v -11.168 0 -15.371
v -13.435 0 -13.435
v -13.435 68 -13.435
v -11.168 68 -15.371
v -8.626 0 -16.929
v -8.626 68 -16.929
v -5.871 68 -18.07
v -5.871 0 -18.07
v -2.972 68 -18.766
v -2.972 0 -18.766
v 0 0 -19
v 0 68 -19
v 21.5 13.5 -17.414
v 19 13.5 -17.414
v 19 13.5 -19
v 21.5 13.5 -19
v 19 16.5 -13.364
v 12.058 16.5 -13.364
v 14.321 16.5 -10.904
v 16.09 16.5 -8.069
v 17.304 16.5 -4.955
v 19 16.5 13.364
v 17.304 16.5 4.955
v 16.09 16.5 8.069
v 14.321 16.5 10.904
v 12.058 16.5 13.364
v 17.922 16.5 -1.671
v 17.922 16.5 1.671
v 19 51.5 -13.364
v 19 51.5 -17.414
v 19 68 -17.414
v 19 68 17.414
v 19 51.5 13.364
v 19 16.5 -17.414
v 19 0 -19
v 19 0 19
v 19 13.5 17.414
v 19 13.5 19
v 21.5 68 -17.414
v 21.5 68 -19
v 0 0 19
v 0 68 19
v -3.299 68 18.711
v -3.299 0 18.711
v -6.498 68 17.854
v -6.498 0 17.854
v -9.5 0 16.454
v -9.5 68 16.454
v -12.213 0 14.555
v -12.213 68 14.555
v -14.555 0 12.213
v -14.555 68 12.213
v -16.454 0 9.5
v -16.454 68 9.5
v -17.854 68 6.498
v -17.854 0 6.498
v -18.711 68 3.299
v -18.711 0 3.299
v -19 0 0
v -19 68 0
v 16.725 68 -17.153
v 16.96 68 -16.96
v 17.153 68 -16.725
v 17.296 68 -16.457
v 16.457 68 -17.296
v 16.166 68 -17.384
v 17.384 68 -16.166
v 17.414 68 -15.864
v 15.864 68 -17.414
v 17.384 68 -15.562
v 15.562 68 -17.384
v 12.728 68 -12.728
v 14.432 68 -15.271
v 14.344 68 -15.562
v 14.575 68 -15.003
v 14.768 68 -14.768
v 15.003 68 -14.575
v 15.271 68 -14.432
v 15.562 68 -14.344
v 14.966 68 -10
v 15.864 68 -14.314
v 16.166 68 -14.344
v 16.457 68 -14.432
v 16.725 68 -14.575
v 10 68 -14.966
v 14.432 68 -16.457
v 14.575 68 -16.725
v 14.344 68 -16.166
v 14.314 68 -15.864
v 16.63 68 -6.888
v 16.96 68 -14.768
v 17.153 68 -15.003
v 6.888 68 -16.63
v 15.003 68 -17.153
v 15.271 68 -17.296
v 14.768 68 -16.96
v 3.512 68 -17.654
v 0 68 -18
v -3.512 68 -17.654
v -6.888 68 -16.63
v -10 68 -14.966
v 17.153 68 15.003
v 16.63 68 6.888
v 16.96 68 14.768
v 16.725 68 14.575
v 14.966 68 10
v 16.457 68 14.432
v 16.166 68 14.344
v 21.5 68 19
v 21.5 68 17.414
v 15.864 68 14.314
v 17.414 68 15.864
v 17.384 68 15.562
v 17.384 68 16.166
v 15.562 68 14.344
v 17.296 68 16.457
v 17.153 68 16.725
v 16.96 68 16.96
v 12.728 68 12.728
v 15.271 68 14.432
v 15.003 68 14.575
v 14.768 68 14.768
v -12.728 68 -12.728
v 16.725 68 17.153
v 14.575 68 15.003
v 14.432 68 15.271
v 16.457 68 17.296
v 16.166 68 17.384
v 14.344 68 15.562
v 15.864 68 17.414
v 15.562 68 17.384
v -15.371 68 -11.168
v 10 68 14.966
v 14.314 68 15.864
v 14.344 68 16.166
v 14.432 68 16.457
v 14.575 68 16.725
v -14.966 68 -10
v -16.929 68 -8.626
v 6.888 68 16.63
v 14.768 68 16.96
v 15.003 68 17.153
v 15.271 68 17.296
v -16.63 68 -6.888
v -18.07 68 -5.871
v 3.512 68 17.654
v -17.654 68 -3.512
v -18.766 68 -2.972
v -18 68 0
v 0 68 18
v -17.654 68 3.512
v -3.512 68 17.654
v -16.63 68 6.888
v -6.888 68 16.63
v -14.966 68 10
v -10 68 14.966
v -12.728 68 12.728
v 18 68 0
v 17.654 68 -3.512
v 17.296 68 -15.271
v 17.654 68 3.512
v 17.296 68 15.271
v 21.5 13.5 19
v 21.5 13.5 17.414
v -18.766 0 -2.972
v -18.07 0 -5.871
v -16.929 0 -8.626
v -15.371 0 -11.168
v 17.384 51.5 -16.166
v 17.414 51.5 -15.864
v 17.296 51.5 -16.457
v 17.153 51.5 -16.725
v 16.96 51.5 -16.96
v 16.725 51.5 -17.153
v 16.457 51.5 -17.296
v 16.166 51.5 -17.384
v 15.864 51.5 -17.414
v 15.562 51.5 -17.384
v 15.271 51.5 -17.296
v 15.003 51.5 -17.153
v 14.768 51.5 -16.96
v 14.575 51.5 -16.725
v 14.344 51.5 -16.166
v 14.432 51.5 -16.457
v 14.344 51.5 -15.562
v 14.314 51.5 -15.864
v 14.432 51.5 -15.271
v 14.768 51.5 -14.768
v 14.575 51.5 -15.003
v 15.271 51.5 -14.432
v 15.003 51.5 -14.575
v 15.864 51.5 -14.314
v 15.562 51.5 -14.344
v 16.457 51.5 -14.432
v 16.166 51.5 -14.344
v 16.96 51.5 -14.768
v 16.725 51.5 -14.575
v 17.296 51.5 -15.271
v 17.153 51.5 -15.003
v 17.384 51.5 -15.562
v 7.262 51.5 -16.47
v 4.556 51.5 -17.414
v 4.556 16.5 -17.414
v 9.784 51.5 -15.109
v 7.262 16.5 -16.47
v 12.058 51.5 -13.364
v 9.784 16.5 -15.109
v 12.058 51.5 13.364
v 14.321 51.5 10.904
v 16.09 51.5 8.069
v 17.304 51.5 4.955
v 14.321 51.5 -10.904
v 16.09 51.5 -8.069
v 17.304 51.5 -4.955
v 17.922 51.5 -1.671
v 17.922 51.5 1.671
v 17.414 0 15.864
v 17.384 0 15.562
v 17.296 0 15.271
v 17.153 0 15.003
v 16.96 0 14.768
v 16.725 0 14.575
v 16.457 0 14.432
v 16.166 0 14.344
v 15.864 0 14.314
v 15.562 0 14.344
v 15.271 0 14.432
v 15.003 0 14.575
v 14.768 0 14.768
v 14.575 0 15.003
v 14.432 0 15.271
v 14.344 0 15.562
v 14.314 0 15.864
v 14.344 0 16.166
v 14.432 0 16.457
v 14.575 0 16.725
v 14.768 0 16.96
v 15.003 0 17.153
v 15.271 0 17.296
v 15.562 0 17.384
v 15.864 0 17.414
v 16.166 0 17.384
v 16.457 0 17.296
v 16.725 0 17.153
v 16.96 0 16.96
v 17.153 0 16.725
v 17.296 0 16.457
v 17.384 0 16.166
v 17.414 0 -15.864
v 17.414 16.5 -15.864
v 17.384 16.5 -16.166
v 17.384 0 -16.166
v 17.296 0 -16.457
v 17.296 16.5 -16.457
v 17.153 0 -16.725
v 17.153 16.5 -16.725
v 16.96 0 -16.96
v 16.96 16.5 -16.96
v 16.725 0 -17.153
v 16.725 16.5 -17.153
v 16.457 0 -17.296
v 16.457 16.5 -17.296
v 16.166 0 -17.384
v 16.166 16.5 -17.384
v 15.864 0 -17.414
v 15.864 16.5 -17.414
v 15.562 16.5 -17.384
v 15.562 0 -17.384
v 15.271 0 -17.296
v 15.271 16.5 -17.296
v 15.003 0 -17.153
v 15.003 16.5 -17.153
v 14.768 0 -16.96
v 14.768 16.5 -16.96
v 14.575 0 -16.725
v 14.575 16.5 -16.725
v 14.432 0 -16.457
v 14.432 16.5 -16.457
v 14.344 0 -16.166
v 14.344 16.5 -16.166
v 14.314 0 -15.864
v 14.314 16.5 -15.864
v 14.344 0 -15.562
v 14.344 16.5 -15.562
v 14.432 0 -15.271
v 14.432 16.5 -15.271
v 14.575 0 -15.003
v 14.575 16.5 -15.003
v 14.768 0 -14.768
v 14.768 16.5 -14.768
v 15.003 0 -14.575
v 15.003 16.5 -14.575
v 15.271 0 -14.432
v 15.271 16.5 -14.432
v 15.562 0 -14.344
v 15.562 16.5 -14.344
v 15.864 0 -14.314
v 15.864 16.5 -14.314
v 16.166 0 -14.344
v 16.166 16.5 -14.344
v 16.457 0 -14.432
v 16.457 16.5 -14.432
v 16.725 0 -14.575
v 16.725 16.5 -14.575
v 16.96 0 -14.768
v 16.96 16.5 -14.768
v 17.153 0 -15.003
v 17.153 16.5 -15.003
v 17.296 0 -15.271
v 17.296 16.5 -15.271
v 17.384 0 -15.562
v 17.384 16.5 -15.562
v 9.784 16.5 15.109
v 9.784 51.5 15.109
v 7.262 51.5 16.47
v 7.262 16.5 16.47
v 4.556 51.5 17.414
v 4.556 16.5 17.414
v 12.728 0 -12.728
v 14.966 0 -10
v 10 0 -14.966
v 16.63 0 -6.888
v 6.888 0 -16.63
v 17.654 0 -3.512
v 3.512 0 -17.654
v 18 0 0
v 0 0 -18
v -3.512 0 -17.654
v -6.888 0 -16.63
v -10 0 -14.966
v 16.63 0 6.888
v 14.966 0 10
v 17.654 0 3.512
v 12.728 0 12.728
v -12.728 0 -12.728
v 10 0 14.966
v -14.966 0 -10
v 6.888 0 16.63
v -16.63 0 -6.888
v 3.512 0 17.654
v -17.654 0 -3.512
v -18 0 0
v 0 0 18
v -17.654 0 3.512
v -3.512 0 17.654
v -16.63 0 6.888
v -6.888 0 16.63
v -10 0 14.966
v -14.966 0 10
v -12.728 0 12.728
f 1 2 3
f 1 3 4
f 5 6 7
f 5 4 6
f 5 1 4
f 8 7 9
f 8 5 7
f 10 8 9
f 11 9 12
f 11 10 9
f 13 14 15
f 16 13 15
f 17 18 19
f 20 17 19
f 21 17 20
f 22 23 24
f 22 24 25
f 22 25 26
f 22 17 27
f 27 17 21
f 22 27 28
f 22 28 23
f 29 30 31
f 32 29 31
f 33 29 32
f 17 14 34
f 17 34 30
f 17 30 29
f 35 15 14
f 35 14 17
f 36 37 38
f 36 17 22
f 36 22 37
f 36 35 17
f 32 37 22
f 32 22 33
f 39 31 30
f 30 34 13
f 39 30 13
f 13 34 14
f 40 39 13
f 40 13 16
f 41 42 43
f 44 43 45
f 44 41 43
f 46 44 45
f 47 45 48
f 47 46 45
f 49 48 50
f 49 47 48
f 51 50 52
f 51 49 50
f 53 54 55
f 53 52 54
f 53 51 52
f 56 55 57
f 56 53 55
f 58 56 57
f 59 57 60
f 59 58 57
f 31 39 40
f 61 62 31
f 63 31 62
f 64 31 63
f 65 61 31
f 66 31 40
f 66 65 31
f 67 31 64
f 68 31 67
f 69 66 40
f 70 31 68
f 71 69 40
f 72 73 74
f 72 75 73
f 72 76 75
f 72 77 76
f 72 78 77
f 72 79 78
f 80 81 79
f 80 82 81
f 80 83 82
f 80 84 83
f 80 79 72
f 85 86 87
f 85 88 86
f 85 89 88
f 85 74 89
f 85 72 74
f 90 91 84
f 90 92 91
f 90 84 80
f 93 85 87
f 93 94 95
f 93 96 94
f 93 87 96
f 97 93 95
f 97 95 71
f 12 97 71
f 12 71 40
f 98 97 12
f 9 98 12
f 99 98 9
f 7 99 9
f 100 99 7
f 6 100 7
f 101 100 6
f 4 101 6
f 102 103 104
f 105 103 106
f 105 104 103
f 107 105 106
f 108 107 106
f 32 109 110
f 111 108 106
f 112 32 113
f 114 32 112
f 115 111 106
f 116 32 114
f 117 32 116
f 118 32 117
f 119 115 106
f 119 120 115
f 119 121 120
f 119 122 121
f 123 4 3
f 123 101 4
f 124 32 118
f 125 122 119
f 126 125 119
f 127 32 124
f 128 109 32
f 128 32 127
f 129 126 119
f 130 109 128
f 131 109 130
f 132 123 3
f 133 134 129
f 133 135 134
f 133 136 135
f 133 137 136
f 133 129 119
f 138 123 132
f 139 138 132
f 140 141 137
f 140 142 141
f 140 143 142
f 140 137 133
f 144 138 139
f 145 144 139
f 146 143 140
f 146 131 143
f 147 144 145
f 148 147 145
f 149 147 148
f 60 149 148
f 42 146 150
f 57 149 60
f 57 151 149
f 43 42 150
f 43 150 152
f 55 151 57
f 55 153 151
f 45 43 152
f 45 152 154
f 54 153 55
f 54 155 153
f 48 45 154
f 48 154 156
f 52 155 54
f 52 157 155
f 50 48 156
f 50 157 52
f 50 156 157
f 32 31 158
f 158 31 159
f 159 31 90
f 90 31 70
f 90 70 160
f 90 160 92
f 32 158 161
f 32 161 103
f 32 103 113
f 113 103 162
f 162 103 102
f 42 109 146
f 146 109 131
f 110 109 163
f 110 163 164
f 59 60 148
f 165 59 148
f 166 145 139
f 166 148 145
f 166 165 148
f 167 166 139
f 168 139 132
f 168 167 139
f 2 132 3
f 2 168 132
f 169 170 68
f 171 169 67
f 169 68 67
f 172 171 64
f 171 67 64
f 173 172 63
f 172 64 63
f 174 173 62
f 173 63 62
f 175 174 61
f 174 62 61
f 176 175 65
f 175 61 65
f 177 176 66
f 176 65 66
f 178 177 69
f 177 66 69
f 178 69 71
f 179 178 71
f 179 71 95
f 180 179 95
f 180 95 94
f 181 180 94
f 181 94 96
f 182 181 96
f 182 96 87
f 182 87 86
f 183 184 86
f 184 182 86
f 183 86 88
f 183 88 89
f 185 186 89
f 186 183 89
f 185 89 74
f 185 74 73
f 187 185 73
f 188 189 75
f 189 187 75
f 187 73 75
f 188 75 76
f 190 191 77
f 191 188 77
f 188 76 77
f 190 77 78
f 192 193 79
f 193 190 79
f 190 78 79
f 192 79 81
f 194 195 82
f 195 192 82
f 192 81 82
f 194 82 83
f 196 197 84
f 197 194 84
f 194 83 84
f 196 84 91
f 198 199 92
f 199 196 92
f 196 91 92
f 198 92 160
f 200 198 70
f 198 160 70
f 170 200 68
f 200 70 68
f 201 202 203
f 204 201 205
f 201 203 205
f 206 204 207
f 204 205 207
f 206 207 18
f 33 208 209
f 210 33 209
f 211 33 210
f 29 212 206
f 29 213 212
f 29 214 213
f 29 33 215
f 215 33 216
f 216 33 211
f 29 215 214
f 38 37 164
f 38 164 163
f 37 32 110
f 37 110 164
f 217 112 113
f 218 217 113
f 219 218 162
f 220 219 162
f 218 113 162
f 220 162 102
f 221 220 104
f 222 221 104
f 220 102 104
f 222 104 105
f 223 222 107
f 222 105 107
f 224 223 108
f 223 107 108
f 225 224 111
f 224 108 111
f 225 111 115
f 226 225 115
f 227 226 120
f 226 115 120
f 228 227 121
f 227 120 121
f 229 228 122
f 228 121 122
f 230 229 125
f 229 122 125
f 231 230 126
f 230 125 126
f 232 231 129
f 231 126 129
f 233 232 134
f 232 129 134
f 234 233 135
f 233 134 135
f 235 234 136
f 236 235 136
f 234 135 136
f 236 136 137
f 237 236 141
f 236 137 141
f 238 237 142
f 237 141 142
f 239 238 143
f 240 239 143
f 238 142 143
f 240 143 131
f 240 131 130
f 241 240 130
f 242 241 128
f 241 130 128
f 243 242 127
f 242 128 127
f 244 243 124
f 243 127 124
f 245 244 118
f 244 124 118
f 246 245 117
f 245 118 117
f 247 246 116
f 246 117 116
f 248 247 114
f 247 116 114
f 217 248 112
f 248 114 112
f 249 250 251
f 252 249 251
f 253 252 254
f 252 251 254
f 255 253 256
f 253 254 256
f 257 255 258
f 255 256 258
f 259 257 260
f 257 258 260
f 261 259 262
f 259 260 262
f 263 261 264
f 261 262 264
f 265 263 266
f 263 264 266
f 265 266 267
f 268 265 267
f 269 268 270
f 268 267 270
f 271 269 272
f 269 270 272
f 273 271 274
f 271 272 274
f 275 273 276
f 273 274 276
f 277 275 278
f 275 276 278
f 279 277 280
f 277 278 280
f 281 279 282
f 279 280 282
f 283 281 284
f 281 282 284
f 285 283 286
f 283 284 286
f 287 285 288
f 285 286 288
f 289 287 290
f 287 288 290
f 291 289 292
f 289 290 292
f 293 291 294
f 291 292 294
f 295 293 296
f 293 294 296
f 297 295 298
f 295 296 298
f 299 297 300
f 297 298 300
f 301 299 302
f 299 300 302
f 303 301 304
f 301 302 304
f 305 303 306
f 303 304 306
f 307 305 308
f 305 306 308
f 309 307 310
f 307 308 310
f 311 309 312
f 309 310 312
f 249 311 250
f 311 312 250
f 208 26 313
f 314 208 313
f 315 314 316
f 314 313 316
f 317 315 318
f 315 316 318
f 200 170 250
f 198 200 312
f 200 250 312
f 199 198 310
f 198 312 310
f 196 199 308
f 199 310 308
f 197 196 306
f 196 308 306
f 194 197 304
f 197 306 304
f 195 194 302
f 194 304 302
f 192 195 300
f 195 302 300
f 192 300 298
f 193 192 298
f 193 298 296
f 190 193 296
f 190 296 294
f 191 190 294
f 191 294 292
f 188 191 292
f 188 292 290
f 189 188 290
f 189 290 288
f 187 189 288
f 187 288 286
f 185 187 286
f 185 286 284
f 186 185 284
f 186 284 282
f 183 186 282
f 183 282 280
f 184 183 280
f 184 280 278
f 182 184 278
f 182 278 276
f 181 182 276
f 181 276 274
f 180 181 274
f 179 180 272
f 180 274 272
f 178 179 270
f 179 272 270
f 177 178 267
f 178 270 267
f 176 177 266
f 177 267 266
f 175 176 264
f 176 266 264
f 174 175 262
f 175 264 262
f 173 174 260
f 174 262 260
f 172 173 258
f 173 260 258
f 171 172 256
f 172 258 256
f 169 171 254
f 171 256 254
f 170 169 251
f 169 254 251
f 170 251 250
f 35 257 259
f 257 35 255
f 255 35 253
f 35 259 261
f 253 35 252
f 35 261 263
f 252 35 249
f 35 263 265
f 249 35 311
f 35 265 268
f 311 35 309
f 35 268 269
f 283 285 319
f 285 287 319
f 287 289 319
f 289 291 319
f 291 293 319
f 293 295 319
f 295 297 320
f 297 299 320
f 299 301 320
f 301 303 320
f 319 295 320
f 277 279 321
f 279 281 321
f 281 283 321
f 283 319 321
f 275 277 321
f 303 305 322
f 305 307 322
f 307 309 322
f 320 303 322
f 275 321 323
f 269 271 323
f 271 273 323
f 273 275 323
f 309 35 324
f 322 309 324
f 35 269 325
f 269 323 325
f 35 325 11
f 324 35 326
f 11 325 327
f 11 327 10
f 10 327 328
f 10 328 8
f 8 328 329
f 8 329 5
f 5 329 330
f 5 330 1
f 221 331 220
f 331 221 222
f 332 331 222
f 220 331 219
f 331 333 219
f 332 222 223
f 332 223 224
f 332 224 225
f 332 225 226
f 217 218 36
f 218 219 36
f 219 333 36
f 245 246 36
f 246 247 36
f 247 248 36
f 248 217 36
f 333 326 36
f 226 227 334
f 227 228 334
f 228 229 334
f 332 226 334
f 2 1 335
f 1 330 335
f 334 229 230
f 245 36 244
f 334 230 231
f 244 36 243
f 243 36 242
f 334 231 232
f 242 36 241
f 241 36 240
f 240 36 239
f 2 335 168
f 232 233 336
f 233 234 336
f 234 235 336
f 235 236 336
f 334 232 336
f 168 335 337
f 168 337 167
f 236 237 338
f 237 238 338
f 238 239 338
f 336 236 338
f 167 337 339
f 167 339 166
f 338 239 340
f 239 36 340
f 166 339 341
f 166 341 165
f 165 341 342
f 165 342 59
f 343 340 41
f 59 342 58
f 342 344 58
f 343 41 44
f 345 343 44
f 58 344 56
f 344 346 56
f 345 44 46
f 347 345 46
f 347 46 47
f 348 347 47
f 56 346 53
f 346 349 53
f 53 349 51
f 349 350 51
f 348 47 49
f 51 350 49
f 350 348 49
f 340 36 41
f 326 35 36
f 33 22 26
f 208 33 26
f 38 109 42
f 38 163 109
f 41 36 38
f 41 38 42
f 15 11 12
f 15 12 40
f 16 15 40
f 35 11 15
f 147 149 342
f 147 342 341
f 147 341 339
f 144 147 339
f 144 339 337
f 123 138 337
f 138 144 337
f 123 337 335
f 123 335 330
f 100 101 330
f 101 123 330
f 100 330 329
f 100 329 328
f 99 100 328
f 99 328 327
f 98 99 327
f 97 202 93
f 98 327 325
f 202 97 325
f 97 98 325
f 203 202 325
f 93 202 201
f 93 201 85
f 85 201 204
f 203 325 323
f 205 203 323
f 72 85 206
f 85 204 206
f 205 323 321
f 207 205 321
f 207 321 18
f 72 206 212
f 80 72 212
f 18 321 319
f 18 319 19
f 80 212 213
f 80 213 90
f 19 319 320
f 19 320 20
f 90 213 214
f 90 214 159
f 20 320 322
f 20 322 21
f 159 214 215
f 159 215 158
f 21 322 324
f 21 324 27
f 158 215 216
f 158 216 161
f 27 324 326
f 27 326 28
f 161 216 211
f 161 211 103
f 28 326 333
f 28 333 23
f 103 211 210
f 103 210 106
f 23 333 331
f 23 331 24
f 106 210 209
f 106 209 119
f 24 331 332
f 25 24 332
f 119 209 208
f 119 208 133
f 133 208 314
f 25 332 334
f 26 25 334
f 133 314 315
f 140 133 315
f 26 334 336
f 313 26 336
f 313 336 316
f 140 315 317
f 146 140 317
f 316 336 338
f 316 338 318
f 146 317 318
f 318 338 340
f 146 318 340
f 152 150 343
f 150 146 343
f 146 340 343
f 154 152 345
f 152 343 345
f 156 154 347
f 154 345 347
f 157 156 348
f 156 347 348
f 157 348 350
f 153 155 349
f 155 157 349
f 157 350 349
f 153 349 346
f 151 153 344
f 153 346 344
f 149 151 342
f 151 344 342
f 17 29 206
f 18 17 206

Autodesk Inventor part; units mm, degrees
ref_plane "YZ Plane" through (0, 0, 0) normal (1, 0, 0) x (0, 1, 0)
ref_plane "XZ Plane" through (0, 0, 0) normal (0, 1, 0) x (-1, 0, 0)
sketch "Sketch1" plane through (0, 0, 0) normal (0, 1, 0) x (-1, 0, 0)
  circle A0 centre (0, 0) radius 18
  arc A1 (19, 0) -> (0, -19) centre (0, 0) ccw
  line L0 (19, -19) -> (0, -19) construction
  line L1 (-19, -19) -> (-19, 19)
  line L2 (-19, 19) -> (0, 19)
  line L3 (19, 19) -> (19, 0) construction
  line L4 (19, -19) -> (-19, 19) construction
  line L5 (-19, -19) -> (19, 19) construction
  line L6 (0, -19) -> (-19, -19)
  line L7 (19, 0) -> (19, -19) construction
  arc A2 (13.435, -13.435) -> (19, 0) centre (0, 0) ccw
  arc A3 (0, -19) -> (13.435, -13.435) centre (0, 0) ccw
  line L8 (0, 19) -> (19, 19) construction
  dimension "d0" = 36
  dimension "d1" = 38
extrude "Extrusion1" add sketch "Sketch1" along normal blind 68
ref_plane "Work Plane2" through (0, 34, 0) normal (0, -1, 0) x (1, 0, 0)
sketch "Sketch10" plane through (0, 68, 0) normal (0, 1, 0) x (1, 0, 0)
  line L0 (19, -19) -> (19, 19) projected
  line L1 (19, 19) -> (12.7279, 12.7279) construction
  circle A0 centre (0, 0) radius 18 projected
  line L2 (0, -19) -> (19, -19) projected
  line L3 (19, -19) -> (12.7279, -12.7279) construction
  circle A1 centre (15.864, 15.864) radius 1.55
  circle A2 centre (15.864, -15.864) radius 1.55
  dimension "d21" = 3.1
  dimension "d22" = 3.1
extrude "Extrusion5" cut sketch "Sketch10" against normal through all contours A1 | A2
sketch "Sketch11" plane through (19, 0, 19) normal (1, 0, 0) x (0, 0, -1)
  line L0 (0, 68) -> (38, 68) projected
  line L1 (0, 0) -> (38, 0) projected
  line L2 (0, 68) -> (38, 0) construction
  line L3 (38, 68) -> (0, 0) construction
  line L4 (36.414, 68) -> (36.414, 0) projected
  line L5 (1.586, 51.5) -> (36.414, 51.5)
  line L6 (36.414, 51.5) -> (36.414, 16.5)
  line L7 (36.414, 16.5) -> (1.586, 16.5)
  line L8 (1.586, 16.5) -> (1.586, 51.5)
  line L9 (1.586, 51.5) -> (36.414, 16.5) construction
  line L10 (36.414, 51.5) -> (1.586, 16.5) construction
  point P0 (19, 0)
  point P1 (19, 34)
  dimension "d25" = 35
extrude "Extrusion6" cut sketch "Sketch11" against normal up to next
sketch "Sketch12" plane through (19, 0, 19) normal (1, 0, 0) x (0, 0, -1)
  line L0 (38, 0) -> (38, 68) projected
  line L1 (36.414, 16.5) -> (36.414, 0) projected
  line L2 (38, 68) -> (36.414, 68)
  line L3 (36.414, 68) -> (36.414, 13.5)
  line L4 (36.414, 13.5) -> (38, 13.5)
  line L5 (38, 13.5) -> (38, 68)
  line L6 (1.586, 16.5) -> (1.586, 0) projected
  line L7 (0, 68) -> (1.586, 68)
  line L8 (1.586, 68) -> (1.586, 13.5)
  line L9 (1.586, 13.5) -> (0, 13.5)
  line L10 (0, 13.5) -> (0, 68)
  point P0 (38, 13.5)
  dimension "d33" = 54.5
extrude "Extrusion7" add sketch "Sketch12" along normal blind 2.5
sketch "Sketch13" plane through (19, 16.5, 17.414) normal (0, 1, 0) x (1, 0, 0)
  line L0 (0, 34.8279) -> (0, 0) projected
  line L1 (0, 34.8279) -> (-3.136, 34.8279) projected
  line L2 (-3.136, 34.8279) -> (-14.4443, 34.8279) projected
  arc A0 (-14.4443, 0) -> (-14.4443, 34.8279) centre (-19, 17.414) ccw projected
  circle A1 centre (-3.136, 33.2779) radius 1.55 projected
  circle A2 centre (-3.136, 33.2779) radius 1.55
  circle A3 centre (-3.136, 33.2779) radius 2.5 construction
  line L3 (0, 30.7779) -> (-6.9416, 30.7779)
  circle A4 centre (-19, 17.414) radius 18
  line L4 (0, 34.8279) -> (-14.4443, 34.8279)
  line L5 (0, 34.8279) -> (0, 30.7779)
  line L6 (-19, 17.414) -> (-15.9745, 17.414) construction
  line L7 (0, 0) -> (-3.136, 0)
  line L8 (-3.136, 0) -> (-14.4443, 0)
  circle A5 centre (-3.136, 1.55) radius 1.55
  circle A6 centre (-3.136, 1.55) radius 1.55
  circle A7 centre (-3.136, 1.55) radius 2.5 construction
  line L9 (0, 4.05) -> (-6.9416, 4.05)
  line L10 (0, 0) -> (-14.4443, 0)
  line L11 (0, 0) -> (0, 4.05)
  point P0 (0, 4.05)
  point P1 (-6.9416, 4.05)
  dimension "d30" = 5
extrude "Extrusion8" add sketch "Sketch13" along normal up to next contours L0 L3 A0 L2 L1 | L0 L7 L8 A0 L9
properties part number "Tubo" material "ABS Plastic"
